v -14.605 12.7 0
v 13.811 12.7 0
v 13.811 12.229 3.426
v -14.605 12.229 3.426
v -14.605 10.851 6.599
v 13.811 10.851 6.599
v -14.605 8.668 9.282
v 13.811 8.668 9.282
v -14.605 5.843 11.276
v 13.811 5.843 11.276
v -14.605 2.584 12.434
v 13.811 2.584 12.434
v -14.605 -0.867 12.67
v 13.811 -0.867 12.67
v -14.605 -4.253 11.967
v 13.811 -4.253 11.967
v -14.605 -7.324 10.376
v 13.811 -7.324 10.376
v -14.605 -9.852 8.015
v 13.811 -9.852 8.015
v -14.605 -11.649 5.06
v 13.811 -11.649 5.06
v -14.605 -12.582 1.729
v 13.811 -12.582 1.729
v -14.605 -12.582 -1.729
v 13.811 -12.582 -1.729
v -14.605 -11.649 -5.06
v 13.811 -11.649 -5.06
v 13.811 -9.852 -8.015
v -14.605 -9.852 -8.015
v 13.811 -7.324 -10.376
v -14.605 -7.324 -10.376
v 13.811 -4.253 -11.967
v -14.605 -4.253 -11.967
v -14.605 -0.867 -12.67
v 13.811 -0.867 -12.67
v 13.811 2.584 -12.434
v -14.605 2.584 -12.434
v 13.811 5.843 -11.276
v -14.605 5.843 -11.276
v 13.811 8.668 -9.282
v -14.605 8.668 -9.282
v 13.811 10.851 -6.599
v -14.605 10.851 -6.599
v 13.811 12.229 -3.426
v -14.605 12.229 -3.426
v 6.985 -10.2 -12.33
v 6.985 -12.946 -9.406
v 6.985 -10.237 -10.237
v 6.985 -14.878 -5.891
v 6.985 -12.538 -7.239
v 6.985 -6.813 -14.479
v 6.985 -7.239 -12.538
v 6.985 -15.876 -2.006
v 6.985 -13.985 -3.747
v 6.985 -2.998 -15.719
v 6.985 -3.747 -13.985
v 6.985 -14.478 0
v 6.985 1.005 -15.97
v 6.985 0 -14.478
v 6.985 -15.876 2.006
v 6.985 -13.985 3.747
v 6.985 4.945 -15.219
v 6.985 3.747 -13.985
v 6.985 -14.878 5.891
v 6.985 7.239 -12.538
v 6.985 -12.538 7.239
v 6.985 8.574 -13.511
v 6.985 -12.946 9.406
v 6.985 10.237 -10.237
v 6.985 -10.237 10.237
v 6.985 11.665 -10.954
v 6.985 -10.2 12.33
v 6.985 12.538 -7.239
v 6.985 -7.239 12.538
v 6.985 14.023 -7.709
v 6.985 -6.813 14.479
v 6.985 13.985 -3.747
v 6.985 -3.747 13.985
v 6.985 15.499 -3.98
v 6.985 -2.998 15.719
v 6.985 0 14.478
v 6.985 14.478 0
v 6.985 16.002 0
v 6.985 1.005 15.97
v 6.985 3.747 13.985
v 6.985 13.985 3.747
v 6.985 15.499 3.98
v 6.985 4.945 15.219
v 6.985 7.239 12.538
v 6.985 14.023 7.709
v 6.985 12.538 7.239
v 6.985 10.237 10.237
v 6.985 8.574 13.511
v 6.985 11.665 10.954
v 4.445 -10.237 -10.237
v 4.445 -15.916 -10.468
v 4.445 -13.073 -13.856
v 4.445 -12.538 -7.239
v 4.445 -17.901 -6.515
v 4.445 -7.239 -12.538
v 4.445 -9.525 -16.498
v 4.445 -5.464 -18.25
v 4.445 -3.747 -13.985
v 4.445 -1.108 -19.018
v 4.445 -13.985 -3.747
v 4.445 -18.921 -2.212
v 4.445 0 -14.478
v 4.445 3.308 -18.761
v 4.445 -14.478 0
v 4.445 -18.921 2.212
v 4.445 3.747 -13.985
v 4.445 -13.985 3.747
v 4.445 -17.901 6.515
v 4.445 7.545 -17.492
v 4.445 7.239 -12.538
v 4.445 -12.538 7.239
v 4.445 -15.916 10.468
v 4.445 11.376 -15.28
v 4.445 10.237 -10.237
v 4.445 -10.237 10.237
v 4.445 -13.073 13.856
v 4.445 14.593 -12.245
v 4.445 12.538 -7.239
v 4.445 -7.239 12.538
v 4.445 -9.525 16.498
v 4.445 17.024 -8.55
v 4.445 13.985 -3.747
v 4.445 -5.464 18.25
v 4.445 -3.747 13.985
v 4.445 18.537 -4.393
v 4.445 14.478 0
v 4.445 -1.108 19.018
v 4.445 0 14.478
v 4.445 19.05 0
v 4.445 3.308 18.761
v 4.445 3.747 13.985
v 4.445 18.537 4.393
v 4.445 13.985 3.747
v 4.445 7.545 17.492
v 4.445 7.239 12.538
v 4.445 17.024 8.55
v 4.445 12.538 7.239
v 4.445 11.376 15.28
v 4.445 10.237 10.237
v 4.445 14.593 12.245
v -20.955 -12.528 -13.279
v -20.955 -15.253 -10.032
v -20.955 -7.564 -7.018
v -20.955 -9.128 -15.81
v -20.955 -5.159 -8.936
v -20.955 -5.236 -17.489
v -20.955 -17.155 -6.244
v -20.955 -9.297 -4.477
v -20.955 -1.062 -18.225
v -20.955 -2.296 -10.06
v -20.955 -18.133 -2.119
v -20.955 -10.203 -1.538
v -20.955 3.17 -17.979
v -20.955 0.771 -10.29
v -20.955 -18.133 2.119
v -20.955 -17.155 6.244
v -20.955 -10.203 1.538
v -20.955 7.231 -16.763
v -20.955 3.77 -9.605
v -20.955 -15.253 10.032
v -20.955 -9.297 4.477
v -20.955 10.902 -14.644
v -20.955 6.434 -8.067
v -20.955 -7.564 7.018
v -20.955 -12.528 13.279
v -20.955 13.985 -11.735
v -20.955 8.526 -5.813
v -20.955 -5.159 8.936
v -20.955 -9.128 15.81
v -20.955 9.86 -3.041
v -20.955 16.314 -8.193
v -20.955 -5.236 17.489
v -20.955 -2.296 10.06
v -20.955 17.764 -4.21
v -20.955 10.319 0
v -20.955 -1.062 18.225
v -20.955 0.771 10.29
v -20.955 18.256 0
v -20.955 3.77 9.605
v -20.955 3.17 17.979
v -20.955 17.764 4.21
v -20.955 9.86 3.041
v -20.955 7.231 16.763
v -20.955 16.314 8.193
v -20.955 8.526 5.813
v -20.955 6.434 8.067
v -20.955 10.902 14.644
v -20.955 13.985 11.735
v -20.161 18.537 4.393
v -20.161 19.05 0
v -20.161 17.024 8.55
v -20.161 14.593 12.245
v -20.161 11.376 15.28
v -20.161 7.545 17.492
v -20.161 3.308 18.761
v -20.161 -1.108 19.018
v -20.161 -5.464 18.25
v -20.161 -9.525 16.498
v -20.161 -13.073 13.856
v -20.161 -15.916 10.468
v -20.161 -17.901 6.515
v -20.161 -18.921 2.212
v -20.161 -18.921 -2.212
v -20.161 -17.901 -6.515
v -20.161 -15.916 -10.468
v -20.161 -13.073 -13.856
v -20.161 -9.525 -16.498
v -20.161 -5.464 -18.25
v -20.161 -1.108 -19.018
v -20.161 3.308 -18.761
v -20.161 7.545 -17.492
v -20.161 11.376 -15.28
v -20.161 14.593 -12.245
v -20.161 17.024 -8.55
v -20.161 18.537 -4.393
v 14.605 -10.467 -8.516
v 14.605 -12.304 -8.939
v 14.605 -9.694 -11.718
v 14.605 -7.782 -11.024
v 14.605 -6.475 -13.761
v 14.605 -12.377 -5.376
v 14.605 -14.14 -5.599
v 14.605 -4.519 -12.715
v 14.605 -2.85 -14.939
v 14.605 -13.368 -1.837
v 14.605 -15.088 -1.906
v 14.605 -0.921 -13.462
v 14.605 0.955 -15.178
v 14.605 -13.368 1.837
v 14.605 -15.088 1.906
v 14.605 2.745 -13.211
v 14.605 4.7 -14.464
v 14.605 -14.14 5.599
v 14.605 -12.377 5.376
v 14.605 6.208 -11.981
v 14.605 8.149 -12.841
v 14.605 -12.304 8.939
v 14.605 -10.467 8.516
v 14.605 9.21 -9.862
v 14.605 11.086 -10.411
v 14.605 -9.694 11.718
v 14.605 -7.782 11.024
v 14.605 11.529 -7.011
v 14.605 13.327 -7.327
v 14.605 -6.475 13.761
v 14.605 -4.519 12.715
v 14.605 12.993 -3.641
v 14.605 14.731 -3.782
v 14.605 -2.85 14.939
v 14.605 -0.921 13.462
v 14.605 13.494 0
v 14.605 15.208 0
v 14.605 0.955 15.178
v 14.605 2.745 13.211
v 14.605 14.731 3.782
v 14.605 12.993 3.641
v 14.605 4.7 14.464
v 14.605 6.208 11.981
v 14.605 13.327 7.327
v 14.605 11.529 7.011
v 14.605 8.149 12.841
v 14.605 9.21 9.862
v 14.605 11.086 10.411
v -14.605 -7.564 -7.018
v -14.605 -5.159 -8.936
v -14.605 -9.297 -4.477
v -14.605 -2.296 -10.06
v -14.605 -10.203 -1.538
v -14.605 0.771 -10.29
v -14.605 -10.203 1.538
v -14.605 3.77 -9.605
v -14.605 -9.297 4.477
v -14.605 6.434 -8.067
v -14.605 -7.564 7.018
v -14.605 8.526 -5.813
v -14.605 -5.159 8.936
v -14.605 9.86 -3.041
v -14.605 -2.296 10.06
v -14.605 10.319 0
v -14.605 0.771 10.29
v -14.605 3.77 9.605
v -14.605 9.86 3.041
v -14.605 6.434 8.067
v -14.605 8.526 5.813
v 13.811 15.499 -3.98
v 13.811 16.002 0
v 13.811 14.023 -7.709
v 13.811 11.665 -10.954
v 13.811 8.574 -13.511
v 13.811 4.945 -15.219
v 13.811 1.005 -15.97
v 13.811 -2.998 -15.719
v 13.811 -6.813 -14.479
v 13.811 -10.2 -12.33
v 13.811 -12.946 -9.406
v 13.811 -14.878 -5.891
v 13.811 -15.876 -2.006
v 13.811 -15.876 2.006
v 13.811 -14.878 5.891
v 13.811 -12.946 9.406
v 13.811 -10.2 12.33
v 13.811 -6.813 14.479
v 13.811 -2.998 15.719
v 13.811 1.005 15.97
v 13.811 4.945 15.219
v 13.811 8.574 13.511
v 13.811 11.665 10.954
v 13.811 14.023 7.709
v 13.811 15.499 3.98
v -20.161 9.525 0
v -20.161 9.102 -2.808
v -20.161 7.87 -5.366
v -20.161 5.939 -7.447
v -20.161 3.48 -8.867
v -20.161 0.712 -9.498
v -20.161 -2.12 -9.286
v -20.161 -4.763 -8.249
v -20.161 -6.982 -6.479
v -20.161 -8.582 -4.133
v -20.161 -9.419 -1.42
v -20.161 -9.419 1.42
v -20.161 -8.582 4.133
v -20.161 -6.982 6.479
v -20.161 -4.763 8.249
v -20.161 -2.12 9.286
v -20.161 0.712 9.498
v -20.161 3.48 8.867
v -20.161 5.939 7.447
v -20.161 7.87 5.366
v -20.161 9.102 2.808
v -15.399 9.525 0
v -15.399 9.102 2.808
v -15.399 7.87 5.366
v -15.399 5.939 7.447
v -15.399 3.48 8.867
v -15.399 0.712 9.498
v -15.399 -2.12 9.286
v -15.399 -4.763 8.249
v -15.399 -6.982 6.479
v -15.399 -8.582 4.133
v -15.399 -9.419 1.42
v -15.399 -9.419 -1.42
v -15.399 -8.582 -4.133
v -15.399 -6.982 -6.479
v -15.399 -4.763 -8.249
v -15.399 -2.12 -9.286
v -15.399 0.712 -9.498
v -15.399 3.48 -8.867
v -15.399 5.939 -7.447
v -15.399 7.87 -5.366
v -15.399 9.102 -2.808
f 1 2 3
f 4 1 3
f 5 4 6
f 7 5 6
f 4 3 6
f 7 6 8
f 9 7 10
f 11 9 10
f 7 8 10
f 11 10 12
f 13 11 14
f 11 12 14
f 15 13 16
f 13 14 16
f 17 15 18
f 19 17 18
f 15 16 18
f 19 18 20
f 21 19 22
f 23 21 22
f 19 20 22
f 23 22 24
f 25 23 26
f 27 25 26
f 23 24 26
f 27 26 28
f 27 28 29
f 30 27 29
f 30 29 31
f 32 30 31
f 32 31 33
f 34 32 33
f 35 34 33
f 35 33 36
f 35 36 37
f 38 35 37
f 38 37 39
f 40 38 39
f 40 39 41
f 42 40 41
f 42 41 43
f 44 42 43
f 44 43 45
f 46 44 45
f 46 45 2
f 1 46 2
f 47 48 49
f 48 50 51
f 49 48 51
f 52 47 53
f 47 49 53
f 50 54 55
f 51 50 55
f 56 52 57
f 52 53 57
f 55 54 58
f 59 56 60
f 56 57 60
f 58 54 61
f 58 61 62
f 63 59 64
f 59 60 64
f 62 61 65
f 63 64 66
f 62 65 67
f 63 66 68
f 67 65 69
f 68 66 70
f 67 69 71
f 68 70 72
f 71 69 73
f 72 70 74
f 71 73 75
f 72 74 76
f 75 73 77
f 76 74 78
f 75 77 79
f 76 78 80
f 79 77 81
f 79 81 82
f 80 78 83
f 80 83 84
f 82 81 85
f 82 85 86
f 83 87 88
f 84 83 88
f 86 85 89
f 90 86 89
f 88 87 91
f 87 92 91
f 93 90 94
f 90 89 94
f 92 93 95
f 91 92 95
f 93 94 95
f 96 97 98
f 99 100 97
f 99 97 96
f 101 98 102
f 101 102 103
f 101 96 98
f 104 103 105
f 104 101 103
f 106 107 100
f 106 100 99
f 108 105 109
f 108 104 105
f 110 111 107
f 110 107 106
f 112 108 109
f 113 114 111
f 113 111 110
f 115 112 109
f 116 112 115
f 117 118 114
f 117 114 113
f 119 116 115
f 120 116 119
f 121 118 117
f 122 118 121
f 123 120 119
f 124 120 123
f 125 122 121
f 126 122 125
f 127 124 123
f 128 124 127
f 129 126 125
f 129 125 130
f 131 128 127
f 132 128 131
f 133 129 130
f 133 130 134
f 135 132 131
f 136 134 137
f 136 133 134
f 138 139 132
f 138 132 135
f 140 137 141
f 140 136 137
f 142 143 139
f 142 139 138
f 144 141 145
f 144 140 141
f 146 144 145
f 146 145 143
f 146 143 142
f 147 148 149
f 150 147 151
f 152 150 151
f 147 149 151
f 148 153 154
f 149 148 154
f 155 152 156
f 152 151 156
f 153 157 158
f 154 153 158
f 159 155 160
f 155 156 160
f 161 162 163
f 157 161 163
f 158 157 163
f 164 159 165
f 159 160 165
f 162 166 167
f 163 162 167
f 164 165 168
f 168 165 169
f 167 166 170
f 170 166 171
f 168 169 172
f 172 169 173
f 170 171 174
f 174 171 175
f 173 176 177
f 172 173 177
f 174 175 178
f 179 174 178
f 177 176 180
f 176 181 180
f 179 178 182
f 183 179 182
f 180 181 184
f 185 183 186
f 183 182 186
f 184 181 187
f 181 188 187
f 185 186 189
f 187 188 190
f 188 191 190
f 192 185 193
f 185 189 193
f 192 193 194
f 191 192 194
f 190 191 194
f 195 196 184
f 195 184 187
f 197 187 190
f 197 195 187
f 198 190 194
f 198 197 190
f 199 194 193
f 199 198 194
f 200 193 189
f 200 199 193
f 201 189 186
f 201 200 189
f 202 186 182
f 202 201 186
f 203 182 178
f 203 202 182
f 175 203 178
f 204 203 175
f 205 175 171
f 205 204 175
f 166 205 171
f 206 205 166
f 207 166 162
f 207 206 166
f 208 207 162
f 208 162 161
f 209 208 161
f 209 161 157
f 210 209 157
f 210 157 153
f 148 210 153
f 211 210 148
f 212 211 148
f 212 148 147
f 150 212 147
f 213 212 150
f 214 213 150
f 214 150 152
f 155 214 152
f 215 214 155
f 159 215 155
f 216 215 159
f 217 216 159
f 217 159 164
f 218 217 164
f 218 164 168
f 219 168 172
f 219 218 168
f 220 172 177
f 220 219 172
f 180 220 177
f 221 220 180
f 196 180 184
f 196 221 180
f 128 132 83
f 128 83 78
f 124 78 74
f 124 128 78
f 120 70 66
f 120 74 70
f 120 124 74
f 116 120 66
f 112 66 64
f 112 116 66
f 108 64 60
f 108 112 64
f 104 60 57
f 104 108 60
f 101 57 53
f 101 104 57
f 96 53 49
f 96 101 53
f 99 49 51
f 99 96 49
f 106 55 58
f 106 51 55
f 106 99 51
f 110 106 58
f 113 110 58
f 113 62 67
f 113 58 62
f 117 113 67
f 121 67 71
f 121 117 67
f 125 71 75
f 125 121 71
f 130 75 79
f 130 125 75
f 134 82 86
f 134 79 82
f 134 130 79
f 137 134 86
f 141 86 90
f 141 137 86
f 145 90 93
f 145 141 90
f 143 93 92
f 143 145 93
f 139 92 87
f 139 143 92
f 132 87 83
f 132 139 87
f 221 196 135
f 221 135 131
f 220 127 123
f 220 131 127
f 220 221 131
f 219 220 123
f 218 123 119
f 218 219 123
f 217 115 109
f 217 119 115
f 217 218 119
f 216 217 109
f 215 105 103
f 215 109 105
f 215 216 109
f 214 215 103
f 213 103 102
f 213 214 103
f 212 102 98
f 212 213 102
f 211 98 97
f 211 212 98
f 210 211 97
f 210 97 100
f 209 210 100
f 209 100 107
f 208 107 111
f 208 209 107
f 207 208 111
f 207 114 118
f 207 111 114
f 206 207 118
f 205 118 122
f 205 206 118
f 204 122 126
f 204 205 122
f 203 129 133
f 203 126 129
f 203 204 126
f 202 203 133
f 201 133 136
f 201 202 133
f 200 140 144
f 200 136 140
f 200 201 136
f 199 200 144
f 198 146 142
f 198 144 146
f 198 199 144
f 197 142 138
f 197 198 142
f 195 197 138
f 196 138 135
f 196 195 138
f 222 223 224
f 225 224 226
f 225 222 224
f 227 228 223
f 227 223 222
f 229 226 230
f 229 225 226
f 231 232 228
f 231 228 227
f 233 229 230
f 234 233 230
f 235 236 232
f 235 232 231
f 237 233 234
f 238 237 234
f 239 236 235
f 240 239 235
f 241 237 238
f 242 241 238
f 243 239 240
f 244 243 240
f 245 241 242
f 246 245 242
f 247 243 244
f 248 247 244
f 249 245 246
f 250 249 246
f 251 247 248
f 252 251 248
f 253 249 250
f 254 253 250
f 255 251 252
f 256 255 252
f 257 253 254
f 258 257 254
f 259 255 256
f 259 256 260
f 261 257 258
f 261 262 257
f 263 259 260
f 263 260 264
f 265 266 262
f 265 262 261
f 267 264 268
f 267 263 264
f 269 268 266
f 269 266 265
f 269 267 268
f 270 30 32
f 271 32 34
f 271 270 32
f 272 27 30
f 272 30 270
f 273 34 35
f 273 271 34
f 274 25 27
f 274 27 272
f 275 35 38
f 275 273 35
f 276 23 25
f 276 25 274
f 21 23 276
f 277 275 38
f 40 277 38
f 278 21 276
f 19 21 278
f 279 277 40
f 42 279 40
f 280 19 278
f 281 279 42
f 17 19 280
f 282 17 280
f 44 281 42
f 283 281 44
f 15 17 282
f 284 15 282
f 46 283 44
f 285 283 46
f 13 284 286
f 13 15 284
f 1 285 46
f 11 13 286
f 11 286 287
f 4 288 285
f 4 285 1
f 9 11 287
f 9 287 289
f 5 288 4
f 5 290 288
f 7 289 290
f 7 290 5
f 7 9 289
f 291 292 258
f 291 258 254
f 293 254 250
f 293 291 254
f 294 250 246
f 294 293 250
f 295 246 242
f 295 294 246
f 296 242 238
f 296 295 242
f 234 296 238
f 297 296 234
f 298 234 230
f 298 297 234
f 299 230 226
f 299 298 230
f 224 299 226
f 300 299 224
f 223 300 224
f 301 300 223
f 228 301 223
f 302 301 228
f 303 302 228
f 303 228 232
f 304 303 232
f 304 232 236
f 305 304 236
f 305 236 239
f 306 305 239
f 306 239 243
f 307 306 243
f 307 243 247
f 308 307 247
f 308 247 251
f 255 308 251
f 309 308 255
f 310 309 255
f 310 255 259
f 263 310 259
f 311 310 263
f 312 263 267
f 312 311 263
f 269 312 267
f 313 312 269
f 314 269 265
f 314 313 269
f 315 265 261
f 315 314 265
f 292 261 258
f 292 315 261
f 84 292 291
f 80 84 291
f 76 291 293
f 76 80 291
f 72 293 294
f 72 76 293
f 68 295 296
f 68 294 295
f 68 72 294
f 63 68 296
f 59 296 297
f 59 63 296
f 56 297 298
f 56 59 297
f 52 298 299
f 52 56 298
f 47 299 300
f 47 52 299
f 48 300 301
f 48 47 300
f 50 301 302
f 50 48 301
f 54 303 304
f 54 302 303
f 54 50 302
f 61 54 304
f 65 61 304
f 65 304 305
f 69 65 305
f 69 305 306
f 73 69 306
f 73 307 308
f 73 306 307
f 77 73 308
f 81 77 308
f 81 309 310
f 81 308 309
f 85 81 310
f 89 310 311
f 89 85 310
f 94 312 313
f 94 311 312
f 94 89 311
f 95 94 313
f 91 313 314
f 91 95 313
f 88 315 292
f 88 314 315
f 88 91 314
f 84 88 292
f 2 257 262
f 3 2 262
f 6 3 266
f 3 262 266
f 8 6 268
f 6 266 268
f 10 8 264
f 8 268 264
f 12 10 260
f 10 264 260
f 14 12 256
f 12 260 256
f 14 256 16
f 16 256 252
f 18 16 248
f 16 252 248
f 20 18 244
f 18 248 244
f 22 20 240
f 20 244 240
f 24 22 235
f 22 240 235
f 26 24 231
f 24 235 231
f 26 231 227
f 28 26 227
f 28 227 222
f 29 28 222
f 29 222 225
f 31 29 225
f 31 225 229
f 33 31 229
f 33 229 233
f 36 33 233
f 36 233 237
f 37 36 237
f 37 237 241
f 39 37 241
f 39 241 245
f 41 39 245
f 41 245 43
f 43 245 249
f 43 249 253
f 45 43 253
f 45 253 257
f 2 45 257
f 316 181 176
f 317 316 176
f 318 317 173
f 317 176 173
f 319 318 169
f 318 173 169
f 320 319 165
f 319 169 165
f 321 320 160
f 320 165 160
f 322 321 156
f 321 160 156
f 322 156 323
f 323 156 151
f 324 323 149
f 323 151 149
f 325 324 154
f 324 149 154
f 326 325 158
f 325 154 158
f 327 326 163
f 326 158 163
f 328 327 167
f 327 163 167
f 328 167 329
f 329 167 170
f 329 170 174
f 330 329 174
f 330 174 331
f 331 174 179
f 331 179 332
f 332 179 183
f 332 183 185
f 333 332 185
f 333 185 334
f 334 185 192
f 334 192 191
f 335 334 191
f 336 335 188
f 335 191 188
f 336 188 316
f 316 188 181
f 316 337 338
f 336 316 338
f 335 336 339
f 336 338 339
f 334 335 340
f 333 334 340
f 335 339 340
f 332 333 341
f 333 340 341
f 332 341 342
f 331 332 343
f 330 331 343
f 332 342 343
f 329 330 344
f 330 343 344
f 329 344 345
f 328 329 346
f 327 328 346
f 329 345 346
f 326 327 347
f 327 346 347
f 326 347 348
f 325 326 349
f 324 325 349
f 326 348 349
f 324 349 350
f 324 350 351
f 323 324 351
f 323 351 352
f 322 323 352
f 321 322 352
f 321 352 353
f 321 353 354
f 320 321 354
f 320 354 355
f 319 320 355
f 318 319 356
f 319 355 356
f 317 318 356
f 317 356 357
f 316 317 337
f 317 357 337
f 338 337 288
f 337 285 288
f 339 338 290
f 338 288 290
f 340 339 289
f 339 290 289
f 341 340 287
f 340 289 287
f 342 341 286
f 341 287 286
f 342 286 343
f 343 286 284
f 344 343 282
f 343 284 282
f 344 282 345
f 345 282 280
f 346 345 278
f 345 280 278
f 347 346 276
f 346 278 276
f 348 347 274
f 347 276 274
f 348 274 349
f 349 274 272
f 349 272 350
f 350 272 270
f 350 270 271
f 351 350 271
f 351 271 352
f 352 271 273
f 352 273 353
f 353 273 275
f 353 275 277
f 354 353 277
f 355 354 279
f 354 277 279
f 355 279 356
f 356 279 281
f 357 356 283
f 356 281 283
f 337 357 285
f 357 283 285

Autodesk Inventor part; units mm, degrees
ref_plane "YZ Plane" through (0, 0, 0) normal (1, 0, 0) x (0, 1, 0)
ref_plane "XZ Plane" through (0, 0, 0) normal (0, 1, 0) x (-1, 0, 0)
ref_plane "XY Plane" through (0, 0, 0) normal (0, 0, 1) x (1, 0, 0)
sketch "Sketch1" plane through (0, 0, 0) normal (0, 0, 1) x (1, 0, 0)
  line L0 (-30.2941, 0) -> (30.2941, 0)
  line L1 (-14.605, 12.7) -> (14.605, 12.7)
  line L2 (14.605, 12.7) -> (14.605, 16.002)
  line L3 (14.605, 16.002) -> (6.985, 16.002)
  line L4 (6.985, 16.002) -> (6.985, 14.478)
  line L5 (6.985, 14.478) -> (4.445, 14.478)
  line L6 (4.445, 14.478) -> (4.445, 19.05)
  line L7 (4.445, 19.05) -> (-20.955, 19.05)
  line L8 (-20.955, 19.05) -> (-20.955, 9.525)
  line L9 (-20.955, 9.525) -> (-14.605, 9.525)
  line L10 (-14.605, 9.525) -> (-14.605, 12.7)
  point P0 (0, 0)
  point P1 (0, 0)
  point P2 (0, 12.7)
  dimension "d0" = 25.4
  dimension "d2" = 19.05
  dimension "d3" = 6.35
  dimension "d4" = 38.1
  dimension "d6" = 19.05
  dimension "d7" = 32.004
  dimension "d8" = 1.524
  dimension "d16" = 10.16
  dimension "d17" = 2.54
revolve "Revolution1" add sketch "Sketch1" angle 360 about axis through (-30.2941, 0, 0) along (1, 0, 0)
thread "Thread1" size "1 1/4-18 UNEF" class "2A" standard "ANSI Unified Screw Threads" full length
chamfer "Chamfer1" distance 0.7937 angle 45 5 edges at (14.605, -16.002, 0) (14.605, -12.7, 0) (-14.605, -9.525, 0) (-20.955, -9.525, 0) (-20.955, -19.05, 0)
properties part number "PommelPart" material "Aluminum 6061"
